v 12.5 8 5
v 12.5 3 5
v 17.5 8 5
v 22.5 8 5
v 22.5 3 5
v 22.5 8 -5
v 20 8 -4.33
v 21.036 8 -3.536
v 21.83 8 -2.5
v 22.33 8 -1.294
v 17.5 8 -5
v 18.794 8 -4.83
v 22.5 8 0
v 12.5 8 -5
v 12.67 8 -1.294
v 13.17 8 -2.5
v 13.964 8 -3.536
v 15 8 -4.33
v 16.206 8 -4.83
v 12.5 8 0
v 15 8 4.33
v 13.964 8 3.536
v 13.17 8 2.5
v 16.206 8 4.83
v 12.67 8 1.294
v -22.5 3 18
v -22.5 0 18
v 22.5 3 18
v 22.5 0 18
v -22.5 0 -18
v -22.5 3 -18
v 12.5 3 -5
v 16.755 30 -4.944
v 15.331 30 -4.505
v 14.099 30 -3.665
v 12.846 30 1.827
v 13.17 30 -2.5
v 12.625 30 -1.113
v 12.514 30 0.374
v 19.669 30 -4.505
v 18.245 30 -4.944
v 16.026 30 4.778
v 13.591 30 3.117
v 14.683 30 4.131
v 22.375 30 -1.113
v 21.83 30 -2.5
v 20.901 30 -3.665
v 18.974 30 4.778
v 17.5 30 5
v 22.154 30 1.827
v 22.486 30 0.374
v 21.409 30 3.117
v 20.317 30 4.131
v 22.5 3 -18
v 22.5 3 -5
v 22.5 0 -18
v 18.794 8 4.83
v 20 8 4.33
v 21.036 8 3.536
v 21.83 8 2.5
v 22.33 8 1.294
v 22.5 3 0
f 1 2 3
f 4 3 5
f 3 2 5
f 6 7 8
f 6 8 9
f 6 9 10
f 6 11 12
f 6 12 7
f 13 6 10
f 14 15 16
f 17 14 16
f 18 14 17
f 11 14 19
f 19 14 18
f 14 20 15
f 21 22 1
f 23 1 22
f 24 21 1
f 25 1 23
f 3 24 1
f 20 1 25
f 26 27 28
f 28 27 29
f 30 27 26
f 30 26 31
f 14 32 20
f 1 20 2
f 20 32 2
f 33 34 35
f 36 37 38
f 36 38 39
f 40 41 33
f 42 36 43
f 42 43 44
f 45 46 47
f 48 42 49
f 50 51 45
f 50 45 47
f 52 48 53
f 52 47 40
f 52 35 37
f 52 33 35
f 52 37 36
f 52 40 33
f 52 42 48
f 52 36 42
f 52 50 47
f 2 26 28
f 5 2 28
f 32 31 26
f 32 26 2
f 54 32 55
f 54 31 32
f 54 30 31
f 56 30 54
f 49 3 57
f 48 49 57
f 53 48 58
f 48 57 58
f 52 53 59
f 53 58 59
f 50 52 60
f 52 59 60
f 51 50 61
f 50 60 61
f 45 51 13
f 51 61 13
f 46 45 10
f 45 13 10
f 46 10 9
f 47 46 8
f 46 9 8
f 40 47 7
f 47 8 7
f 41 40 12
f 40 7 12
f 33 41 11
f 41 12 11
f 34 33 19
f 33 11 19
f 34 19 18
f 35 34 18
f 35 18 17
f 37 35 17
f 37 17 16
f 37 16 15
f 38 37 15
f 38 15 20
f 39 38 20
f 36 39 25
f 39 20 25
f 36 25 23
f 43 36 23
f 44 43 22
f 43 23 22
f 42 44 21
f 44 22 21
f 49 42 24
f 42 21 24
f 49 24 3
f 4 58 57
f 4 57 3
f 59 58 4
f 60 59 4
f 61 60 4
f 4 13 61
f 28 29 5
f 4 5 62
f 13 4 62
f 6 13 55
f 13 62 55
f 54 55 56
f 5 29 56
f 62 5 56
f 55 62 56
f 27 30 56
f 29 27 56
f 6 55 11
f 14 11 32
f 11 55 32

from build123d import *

# Parameters (mm, degrees)
SKETCH1_W           = 45
SKETCH1_H           = 36
BOSS_EXTRUDE1_DEPTH = 3
SKETCH2_W           = 10
SKETCH2_H           = 10
BOSS_EXTRUDE2_DEPTH = 5
SKETCH2_3_R         = 5
BOSS_EXTRUDE3_DEPTH = 27


with BuildPart() as part:
    # Sketch1 → Boss-Extrude1 (new body)
    with BuildSketch(Plane(origin=(0, 0, 0), x_dir=(1, 0, 0), z_dir=(0, 1, 0))):
        Rectangle(SKETCH1_W, SKETCH1_H)
    extrude(amount=BOSS_EXTRUDE1_DEPTH)

    # Sketch2 → Boss-Extrude2 (add)
    with BuildSketch(Plane(origin=(0, 3, 0), x_dir=(1, 0, 0), z_dir=(0, 1, 0))):
        with BuildLine():
            ThreePointArc((17.5, 5), (13.964466095, 3.535533907), (12.5, 4e-09))
            Line((12.5, 0), (22.5, 0))
            ThreePointArc((22.5, 0), (21.035533906, 3.535533906), (17.5, 5))
        make_face()
        with BuildLine():
            Line((22.5, 0), (12.5, 0))
            ThreePointArc((12.5, 4e-09), (13.964466099, -3.535533911), (17.500000019, -5))
            ThreePointArc((17.500000019, -5), (21.035533913, -3.535533899), (22.5, 0))
        make_face()
        with Locations((17.5, 0)):
            Rectangle(SKETCH2_W, SKETCH2_H)
    extrude(amount=BOSS_EXTRUDE2_DEPTH)

    # Sketch2<3> → Boss-Extrude3 (add)
    with BuildSketch(Plane(origin=(0, 3, 0), x_dir=(1, 0, 0), z_dir=(0, 1, 0))):
        with Locations(Location((17.5, 0, 0), (0, 0, 270))):
            Circle(SKETCH2_3_R)
    extrude(amount=BOSS_EXTRUDE3_DEPTH)


solid = part.part
